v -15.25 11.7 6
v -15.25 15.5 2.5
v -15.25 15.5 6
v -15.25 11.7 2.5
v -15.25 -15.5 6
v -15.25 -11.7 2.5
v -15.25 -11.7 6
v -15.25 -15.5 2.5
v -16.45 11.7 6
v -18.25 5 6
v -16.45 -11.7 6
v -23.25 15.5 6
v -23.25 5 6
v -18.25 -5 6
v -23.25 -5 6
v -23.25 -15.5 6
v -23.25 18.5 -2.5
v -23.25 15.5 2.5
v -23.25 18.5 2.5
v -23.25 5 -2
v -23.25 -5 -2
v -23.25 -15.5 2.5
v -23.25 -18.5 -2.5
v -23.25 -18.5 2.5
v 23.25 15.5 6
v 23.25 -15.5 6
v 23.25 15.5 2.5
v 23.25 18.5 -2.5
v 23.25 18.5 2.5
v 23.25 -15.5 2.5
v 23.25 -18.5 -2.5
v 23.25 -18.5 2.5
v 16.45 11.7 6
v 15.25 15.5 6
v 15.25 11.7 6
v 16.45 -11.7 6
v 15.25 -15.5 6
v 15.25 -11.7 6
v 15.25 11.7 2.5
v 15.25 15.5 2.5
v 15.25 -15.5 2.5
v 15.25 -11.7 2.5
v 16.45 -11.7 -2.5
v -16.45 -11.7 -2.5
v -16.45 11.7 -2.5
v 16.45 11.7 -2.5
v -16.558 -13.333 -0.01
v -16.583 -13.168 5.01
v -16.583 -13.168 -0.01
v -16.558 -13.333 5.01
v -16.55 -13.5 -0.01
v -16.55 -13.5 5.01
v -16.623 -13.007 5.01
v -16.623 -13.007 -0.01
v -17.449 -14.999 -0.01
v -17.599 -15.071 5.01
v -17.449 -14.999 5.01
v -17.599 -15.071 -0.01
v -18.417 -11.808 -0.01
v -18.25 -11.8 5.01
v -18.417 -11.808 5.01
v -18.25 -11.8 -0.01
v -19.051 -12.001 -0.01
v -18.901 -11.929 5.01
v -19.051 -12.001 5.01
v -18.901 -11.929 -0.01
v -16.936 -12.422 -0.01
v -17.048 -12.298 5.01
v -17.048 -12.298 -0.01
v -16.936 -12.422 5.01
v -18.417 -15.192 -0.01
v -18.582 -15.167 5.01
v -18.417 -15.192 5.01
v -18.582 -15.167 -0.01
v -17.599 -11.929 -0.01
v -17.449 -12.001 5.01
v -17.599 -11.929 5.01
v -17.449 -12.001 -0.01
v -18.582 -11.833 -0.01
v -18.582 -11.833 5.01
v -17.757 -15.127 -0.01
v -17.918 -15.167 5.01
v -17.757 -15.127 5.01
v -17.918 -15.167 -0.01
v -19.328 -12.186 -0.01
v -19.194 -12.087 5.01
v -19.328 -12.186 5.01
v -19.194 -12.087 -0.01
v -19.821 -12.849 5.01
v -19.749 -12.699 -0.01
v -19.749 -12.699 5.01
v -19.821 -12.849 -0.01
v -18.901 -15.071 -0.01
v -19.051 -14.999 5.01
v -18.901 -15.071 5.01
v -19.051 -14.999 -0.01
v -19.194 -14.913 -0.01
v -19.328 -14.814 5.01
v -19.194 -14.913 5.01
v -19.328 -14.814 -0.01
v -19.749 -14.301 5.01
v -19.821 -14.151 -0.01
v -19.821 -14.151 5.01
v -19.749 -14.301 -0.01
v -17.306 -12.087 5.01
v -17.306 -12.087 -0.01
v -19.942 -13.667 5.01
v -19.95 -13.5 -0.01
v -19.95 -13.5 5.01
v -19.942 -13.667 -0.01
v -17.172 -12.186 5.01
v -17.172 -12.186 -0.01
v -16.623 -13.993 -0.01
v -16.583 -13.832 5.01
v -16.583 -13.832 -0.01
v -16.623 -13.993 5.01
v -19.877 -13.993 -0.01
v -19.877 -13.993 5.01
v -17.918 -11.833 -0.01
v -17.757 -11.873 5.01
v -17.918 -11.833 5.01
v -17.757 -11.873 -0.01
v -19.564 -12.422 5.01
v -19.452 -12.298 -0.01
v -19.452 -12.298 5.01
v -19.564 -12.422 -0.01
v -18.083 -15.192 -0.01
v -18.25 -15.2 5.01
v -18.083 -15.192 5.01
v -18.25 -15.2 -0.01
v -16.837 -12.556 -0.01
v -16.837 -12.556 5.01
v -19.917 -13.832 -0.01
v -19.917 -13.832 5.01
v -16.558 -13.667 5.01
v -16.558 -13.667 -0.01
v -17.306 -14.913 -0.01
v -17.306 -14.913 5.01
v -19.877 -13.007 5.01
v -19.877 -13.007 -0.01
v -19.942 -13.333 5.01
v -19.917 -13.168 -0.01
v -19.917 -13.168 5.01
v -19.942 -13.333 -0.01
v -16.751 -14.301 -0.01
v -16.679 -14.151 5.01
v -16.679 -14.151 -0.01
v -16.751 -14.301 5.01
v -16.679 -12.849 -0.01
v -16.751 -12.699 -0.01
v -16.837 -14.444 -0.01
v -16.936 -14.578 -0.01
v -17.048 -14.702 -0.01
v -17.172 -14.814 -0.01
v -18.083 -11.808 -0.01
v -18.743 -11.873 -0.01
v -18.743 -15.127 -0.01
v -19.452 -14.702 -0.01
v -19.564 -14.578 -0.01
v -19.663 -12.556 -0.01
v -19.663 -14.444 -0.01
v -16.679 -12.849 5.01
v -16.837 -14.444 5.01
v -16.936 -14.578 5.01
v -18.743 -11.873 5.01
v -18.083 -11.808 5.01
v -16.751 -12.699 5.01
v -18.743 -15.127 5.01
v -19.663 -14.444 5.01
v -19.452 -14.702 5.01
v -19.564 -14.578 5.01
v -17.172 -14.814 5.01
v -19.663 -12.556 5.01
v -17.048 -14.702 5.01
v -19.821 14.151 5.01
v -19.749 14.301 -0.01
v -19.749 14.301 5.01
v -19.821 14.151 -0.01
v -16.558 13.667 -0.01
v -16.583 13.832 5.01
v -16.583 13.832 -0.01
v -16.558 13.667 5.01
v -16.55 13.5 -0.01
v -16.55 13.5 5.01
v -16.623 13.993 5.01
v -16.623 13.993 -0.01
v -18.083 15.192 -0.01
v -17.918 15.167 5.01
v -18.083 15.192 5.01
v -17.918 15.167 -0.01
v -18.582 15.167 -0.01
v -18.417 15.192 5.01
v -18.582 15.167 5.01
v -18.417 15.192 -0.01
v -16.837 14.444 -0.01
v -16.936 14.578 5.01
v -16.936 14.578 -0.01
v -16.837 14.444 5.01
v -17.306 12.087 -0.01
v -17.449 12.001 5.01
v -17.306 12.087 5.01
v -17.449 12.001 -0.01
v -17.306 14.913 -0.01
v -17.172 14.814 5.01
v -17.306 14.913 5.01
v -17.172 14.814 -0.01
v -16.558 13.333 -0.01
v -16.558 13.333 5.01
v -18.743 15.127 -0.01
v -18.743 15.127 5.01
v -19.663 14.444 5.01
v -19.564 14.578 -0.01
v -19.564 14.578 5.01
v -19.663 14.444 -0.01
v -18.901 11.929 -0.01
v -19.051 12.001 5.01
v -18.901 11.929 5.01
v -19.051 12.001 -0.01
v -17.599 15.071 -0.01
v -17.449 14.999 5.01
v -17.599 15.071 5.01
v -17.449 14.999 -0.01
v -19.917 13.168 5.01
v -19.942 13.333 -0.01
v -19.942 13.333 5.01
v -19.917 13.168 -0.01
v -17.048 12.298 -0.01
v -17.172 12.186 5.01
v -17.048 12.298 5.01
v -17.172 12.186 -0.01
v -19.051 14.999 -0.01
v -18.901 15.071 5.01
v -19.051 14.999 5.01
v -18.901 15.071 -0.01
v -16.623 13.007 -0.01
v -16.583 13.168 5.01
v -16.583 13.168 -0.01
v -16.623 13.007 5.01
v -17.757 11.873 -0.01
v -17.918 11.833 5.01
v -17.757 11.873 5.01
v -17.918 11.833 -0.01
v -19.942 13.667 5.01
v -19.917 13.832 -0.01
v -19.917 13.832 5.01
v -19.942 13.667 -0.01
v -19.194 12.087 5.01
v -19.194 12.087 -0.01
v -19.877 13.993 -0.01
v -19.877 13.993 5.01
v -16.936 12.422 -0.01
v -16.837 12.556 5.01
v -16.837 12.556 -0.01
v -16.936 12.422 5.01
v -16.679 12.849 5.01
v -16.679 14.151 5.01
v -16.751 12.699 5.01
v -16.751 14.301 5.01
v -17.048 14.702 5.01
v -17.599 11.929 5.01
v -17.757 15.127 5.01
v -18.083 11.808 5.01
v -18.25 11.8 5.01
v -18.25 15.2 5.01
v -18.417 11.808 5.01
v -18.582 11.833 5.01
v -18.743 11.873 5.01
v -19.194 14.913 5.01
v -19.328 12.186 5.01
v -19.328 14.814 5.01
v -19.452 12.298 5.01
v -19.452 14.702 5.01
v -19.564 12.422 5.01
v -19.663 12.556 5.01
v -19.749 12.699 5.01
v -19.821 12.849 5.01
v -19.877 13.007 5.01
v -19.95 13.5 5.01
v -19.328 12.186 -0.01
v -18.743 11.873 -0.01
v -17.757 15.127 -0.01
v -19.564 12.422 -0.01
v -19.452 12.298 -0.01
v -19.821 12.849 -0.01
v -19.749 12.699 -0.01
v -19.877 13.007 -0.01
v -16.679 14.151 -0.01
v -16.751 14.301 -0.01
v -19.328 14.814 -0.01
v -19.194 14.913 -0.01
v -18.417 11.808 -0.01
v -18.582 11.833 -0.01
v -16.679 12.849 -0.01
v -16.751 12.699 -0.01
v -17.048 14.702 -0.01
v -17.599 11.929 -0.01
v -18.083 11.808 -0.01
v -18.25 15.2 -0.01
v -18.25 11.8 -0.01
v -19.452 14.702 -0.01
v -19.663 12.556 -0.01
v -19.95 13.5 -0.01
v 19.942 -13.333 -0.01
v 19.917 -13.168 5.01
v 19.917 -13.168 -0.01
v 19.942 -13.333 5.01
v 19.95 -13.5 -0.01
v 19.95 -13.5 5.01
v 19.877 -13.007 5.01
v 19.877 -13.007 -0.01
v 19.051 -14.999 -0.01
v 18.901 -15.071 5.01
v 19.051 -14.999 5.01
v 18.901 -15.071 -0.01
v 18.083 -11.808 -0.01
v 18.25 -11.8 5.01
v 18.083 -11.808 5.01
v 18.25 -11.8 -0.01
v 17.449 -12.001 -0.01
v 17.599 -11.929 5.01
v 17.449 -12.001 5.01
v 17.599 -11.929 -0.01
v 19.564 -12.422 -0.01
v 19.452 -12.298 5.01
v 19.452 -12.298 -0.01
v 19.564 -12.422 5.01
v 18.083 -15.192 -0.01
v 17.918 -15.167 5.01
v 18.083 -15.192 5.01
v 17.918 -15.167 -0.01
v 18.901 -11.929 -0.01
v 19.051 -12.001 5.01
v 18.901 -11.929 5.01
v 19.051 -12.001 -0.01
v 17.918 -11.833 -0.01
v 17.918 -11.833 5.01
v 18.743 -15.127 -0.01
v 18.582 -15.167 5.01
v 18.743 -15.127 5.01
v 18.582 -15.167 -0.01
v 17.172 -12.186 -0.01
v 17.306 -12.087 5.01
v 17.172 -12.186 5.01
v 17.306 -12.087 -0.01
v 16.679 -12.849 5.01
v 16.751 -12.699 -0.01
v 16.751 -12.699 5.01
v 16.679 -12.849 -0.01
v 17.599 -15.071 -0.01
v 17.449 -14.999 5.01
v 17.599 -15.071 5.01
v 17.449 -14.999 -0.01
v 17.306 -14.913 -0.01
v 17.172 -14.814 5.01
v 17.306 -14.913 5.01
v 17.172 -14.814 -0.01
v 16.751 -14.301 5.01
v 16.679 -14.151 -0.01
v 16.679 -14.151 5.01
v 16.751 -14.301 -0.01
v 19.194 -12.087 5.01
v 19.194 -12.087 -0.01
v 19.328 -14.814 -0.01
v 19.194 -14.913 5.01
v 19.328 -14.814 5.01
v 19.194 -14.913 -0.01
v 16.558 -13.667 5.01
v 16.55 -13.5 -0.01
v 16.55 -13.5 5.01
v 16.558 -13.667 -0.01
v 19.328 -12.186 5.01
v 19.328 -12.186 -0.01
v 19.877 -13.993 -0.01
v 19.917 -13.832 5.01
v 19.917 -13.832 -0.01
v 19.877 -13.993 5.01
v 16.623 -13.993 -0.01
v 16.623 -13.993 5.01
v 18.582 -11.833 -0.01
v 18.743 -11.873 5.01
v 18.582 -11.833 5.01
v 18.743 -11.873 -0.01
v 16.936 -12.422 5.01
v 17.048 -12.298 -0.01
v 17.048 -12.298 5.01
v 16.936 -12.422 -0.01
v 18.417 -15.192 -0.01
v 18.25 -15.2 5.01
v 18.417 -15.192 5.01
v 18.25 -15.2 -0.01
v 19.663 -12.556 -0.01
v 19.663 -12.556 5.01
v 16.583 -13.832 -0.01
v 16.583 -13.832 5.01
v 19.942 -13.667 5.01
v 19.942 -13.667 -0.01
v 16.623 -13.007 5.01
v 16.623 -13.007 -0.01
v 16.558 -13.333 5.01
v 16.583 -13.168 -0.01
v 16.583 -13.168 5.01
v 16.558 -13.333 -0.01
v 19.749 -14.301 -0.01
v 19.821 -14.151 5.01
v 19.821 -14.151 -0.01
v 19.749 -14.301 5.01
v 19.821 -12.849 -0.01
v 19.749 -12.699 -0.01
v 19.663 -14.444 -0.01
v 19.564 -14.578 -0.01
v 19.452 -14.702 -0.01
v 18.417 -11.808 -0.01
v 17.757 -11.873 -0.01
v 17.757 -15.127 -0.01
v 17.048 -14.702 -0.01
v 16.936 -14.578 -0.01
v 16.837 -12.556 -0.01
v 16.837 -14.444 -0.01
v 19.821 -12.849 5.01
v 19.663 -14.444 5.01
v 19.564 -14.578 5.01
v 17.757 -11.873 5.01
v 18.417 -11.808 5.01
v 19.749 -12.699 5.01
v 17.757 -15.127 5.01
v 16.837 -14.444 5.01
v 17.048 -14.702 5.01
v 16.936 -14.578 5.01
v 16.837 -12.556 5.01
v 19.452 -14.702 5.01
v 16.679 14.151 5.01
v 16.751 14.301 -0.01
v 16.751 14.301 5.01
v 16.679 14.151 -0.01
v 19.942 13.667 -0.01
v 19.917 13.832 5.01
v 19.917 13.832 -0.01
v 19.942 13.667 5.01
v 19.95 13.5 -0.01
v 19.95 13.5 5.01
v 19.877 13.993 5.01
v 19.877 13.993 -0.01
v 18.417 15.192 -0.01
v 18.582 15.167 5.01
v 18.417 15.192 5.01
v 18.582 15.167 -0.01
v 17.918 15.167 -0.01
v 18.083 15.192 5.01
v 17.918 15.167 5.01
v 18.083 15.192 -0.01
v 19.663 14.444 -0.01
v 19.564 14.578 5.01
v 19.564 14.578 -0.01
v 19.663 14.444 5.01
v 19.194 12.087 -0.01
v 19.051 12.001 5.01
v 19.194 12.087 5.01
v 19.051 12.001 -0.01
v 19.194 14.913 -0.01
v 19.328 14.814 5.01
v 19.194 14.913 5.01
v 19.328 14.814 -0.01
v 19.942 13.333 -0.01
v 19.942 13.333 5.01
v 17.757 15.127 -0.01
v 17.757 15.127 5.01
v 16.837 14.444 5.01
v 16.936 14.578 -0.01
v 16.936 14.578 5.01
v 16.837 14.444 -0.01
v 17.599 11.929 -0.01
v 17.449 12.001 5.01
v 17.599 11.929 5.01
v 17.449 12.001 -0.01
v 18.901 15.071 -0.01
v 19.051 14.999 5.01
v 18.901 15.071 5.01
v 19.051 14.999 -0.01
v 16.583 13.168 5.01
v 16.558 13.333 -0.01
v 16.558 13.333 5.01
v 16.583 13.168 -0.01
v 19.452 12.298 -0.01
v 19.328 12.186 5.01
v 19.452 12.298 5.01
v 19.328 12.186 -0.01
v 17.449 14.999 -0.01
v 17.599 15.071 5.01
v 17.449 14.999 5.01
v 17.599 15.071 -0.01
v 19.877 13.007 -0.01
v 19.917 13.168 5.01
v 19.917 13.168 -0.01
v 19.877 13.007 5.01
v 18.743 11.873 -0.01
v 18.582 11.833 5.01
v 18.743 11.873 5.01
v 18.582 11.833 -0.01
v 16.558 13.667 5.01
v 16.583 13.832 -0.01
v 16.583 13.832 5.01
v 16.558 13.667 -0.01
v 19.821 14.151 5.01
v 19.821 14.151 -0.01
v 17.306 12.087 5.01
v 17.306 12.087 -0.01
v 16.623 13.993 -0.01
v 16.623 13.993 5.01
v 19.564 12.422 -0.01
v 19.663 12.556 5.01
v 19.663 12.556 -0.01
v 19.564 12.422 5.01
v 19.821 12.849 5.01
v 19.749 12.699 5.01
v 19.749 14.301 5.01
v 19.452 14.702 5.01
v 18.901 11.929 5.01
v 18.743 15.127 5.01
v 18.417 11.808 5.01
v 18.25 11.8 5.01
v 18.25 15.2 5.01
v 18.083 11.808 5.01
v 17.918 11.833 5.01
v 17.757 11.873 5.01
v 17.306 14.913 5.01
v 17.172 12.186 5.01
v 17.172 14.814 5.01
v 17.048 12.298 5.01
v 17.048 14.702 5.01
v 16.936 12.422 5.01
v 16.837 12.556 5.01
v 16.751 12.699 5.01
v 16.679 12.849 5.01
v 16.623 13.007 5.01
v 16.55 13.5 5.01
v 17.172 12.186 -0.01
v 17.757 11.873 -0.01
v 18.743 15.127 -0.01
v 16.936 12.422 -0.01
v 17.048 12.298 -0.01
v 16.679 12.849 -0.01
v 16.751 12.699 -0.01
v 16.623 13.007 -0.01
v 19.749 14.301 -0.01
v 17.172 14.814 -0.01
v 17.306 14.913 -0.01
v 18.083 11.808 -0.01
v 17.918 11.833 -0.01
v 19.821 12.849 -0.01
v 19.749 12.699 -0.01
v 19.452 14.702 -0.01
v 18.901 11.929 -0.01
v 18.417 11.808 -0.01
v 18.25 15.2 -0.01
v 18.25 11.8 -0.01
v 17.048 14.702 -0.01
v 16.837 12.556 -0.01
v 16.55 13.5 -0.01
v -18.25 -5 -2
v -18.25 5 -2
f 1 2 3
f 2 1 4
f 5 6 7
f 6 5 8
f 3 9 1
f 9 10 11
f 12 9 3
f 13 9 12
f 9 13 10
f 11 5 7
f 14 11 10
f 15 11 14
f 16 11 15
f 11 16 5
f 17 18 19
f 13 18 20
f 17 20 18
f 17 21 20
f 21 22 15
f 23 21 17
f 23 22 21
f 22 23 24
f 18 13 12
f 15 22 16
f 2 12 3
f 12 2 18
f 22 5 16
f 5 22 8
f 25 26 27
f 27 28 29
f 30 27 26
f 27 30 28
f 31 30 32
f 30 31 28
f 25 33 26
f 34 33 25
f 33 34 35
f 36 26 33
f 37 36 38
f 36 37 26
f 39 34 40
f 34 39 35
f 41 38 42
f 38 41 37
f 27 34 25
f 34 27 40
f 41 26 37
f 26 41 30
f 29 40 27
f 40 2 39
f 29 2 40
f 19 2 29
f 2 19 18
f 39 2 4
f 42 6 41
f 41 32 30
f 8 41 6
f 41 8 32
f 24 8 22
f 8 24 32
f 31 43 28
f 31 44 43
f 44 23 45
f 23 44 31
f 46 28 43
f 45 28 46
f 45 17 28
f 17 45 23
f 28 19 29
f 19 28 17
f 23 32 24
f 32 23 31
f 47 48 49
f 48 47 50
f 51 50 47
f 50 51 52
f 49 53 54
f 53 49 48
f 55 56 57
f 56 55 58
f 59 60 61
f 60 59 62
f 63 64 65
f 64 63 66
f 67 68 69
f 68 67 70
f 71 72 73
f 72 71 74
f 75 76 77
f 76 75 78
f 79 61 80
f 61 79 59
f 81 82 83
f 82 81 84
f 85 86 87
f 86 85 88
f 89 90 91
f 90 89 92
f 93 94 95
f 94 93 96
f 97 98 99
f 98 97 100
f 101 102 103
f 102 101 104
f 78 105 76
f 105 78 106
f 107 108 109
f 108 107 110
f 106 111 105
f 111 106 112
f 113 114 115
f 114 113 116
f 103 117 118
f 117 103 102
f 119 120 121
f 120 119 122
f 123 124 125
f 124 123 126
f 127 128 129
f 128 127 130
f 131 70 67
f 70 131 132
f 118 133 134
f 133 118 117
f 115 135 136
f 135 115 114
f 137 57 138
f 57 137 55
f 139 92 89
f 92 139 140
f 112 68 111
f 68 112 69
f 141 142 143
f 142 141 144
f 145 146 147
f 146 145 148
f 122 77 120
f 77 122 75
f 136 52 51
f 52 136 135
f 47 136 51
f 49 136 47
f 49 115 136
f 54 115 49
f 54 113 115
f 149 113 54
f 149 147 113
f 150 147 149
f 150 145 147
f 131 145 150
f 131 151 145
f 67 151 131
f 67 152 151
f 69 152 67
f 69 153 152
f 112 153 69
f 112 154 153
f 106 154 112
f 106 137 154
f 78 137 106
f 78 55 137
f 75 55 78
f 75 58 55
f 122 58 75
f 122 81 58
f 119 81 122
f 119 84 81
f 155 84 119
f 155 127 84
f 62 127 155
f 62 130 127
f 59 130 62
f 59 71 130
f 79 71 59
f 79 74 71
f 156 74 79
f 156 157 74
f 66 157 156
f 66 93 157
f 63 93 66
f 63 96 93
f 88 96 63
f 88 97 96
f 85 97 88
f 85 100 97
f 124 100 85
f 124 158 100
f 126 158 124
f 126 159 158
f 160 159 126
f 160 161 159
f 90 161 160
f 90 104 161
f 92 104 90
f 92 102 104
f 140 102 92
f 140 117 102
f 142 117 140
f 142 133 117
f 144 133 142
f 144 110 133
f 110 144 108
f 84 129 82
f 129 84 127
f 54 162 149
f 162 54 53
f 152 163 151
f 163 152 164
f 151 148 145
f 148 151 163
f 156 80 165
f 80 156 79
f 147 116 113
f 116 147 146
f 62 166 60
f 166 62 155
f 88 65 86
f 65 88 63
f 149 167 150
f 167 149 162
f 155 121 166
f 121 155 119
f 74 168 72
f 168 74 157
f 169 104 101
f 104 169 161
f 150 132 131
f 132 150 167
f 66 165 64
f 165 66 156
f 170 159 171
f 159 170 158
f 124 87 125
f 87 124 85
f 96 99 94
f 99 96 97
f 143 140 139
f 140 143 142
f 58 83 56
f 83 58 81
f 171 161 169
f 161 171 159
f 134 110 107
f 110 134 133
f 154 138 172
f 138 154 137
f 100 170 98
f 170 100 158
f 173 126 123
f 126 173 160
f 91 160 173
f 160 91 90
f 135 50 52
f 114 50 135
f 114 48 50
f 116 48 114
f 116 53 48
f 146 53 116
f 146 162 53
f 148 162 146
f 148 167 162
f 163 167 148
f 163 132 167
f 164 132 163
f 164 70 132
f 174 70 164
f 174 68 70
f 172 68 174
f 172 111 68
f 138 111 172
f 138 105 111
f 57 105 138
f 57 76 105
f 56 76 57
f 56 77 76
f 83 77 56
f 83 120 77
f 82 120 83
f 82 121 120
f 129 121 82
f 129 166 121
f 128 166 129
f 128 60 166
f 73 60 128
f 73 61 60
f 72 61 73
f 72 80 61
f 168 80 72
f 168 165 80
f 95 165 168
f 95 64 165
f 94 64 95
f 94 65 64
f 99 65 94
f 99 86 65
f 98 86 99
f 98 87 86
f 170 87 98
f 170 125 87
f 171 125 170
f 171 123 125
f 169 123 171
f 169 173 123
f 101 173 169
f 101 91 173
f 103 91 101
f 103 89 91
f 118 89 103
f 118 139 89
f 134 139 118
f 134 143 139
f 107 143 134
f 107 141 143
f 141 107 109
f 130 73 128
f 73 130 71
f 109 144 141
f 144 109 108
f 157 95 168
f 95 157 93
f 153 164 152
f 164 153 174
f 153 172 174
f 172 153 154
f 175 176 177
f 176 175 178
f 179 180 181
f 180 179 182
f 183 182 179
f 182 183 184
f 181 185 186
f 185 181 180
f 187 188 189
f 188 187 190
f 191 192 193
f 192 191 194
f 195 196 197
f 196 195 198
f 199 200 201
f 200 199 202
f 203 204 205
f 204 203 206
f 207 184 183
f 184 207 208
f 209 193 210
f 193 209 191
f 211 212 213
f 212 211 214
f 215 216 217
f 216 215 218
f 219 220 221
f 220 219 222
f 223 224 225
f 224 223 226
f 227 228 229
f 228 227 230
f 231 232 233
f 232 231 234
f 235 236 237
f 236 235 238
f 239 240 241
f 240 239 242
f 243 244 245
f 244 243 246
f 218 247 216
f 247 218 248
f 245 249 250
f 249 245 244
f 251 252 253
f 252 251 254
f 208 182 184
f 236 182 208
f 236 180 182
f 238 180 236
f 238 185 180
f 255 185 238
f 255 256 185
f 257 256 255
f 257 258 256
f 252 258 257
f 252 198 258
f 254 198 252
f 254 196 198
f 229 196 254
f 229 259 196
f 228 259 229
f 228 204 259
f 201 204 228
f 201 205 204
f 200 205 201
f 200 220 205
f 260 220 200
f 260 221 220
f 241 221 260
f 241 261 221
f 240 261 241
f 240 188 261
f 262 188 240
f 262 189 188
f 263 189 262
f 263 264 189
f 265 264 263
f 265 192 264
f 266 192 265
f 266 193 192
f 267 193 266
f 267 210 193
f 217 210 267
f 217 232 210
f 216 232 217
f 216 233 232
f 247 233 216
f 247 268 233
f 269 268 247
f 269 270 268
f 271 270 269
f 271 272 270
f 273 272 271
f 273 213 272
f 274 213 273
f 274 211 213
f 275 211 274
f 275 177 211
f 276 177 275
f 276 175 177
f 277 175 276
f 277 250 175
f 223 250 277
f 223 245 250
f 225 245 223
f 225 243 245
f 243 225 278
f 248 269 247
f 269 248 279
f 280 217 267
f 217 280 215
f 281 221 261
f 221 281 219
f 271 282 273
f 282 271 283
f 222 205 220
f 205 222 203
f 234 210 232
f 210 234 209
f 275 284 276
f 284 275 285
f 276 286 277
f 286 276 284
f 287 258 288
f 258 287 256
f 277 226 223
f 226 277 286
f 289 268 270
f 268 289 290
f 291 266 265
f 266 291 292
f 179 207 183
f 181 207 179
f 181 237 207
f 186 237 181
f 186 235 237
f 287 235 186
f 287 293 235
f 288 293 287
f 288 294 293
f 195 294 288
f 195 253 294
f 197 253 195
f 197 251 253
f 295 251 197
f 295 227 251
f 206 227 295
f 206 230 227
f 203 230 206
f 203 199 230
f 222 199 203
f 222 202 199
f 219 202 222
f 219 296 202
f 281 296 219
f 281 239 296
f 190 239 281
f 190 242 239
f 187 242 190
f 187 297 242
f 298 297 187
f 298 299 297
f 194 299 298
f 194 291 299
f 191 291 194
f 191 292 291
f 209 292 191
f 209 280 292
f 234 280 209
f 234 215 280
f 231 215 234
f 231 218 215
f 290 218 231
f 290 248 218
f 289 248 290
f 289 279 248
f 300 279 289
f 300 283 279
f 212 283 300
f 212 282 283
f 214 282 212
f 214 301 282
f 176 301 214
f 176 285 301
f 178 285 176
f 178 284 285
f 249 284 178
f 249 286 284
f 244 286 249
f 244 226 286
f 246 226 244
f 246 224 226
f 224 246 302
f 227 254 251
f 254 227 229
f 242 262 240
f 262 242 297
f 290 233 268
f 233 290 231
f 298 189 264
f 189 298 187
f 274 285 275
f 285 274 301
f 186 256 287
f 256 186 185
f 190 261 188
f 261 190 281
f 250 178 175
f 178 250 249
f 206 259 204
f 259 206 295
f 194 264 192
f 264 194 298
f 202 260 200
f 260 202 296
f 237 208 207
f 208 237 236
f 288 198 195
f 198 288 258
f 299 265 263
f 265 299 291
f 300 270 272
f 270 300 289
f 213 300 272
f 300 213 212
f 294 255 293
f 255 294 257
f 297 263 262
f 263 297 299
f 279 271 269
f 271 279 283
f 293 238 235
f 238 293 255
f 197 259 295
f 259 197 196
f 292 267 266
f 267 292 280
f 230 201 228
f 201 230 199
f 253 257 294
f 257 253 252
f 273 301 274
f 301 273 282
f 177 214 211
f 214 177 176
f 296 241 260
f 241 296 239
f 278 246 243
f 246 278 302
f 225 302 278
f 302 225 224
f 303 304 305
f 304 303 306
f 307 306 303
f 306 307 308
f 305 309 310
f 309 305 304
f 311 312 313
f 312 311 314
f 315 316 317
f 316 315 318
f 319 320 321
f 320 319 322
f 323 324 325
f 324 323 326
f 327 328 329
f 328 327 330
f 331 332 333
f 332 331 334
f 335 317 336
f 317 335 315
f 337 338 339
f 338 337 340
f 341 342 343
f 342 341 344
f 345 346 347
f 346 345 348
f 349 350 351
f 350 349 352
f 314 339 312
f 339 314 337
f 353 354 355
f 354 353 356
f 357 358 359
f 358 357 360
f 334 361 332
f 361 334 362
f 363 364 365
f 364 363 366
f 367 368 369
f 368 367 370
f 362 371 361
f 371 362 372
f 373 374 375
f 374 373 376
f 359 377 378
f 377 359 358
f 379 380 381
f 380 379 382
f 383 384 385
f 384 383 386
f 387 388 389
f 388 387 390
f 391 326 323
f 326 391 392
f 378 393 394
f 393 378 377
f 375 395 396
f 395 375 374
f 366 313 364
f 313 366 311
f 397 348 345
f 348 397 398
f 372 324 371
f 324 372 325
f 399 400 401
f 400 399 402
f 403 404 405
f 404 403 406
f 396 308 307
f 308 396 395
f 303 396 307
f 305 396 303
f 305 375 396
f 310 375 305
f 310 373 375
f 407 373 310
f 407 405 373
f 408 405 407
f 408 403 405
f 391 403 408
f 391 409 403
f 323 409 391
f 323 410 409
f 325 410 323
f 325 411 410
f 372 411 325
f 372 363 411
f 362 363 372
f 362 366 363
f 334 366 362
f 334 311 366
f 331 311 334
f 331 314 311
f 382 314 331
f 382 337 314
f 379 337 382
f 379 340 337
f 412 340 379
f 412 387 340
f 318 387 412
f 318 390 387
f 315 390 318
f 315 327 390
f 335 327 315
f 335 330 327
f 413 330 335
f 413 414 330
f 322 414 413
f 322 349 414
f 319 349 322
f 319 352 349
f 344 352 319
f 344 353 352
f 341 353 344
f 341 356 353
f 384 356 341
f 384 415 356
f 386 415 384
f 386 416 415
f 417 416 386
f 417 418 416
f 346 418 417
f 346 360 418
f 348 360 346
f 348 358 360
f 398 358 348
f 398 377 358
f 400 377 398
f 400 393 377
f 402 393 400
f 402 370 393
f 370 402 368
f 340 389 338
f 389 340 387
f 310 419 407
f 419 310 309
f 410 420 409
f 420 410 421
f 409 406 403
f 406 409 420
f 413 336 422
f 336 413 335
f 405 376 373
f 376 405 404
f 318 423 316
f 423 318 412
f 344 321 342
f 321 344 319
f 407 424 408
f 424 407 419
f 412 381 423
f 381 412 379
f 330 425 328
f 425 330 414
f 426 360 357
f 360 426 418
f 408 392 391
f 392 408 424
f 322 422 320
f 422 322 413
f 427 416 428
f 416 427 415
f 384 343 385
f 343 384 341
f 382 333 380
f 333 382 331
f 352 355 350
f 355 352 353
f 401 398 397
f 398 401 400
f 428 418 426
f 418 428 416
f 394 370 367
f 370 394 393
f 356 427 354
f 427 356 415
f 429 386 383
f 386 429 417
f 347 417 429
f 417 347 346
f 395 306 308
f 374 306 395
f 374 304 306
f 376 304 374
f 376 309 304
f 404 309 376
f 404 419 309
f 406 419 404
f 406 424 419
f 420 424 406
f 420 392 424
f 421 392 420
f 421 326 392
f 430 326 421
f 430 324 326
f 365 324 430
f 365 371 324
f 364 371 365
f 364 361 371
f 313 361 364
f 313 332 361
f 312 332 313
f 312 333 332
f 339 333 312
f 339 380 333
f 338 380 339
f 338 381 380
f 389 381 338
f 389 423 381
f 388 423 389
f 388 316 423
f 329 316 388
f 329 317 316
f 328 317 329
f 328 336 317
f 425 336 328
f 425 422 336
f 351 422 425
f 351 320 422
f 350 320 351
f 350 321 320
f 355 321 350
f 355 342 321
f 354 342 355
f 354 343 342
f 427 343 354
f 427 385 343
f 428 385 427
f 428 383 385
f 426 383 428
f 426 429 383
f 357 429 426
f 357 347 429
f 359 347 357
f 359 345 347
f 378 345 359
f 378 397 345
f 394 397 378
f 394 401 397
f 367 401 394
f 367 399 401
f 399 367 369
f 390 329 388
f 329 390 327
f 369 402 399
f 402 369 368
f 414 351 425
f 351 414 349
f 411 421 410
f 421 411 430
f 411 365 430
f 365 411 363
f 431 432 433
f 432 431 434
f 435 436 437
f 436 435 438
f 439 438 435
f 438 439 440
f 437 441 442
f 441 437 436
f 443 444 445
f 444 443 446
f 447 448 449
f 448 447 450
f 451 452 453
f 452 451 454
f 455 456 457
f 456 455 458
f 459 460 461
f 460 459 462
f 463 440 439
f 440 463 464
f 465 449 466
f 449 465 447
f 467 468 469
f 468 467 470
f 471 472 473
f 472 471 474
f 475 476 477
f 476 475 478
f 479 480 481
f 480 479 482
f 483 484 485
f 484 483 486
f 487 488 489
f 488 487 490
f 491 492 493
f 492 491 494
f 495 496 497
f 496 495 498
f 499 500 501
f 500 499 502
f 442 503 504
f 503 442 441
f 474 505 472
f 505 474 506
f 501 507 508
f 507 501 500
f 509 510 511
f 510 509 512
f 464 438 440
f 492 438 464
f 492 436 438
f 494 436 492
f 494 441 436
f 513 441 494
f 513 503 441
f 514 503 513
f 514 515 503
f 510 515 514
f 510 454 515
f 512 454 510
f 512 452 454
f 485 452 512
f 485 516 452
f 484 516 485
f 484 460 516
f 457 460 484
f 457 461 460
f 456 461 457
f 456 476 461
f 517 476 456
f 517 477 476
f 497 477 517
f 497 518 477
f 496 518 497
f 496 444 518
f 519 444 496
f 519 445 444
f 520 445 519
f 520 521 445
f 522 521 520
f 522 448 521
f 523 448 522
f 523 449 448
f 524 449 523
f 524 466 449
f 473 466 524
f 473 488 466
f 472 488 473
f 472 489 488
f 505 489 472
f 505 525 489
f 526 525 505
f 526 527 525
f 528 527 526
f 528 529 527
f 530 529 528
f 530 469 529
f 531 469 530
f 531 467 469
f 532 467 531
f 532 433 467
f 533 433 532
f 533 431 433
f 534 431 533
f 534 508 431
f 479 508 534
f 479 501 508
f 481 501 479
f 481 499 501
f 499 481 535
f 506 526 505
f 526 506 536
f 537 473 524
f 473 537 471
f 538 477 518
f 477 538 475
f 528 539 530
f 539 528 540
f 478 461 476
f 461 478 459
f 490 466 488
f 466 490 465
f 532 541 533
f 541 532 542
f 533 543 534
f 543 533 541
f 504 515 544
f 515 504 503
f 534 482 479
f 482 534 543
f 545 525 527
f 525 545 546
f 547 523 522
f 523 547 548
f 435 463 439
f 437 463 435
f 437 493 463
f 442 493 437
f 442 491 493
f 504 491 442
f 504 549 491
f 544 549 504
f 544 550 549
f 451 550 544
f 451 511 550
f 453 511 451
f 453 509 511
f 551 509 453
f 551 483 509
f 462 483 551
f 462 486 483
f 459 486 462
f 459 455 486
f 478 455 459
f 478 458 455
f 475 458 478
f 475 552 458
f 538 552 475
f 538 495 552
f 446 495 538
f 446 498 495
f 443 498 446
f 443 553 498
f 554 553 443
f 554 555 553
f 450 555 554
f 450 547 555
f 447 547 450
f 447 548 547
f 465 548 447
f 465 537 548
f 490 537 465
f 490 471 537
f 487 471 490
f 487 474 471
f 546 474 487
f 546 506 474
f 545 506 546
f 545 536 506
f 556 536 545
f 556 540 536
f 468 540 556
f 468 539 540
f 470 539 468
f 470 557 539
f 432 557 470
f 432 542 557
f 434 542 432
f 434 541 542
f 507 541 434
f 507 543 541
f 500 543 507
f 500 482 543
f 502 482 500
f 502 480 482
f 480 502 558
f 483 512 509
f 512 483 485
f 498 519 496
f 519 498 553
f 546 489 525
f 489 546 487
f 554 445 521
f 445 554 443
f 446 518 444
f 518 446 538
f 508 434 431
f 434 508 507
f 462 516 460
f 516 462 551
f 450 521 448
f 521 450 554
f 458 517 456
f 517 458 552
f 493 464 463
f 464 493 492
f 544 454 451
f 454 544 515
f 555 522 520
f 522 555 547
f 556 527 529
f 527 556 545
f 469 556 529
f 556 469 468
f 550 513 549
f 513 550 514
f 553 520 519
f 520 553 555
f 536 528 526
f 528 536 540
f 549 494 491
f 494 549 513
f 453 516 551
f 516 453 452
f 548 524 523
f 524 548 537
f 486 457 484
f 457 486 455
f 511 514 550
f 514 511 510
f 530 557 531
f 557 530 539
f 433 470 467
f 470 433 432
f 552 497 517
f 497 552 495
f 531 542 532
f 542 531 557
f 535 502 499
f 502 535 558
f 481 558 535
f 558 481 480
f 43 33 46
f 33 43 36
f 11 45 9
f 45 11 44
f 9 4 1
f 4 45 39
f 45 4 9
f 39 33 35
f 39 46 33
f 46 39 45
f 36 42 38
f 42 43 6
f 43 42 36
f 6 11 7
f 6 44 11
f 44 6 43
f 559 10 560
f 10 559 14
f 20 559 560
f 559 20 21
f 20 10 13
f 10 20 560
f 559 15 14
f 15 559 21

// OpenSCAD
// file: params.scad
// ============================================================================
//  Робосумо 3 кг — спільні параметри
//  Усі розміри в міліметрах. Прав завжди тут, а не в окремих деталях.
//
//  Позначки:
//    ✅  підтверджено з даташита виробника
//    ❓  VERIFY — виміряй свою деталь штангенциркулем і виправ
// ============================================================================

// --- габарит робота ---------------------------------------------------------
CHASSIS_W       = 200;      // ✅ ліміт класу 200 x 200 мм
CHASSIS_L       = 200;
PLATE_T         = 6;        // товщина друкованого прототипу основи
ALLOY_T         = 4;        // товщина алюмінієвої бойової основи

// --- колеса -----------------------------------------------------------------
WHEEL_D         = 50;
WHEEL_W         = 15;
WHEEL_TRACK     = 150;      // між центрами коліс уздовж осі X
WHEELBASE       = 130;      // між центрами коліс уздовж осі Y

// --- мотор Pololu 37D (✅ усі з pololu.com/product/4745) --------------------
MOTOR_BODY_D    = 37;       // ✅ діаметр корпусу редуктора
MOTOR_SHAFT_D   = 6;        // ✅ D-подібний вал
MOTOR_SHAFT_L   = 16;       // ✅ довжина вала
MOTOR_HEX_PITCH = 15.5;     // ✅ суміжні отвори кріплення, правильний шестикутник
MOTOR_HEX_R     = MOTOR_HEX_PITCH / sqrt(3);   // ≈ 8.949 радіус описаного кола
MOTOR_SCREW_MAX = 3;        // ✅ Pololu: НЕ закручувати глибше 3 мм — дістане шестерні
MOTOR_TOTAL_L   = 57;       // ✅ 37Dx57L

// --- кріплення --------------------------------------------------------------
M3_CLEAR        = 3.4;
M3_TAP          = 2.9;
M2_CLEAR        = 2.2;
HEATSET_M3_D    = 4.0;      // отвір під термозакладну гайку M3
HEATSET_M3_H    = 5.7;

// --- плати (❓ виміряй свої) ------------------------------------------------
NANO_W          = 18;       // ✅ стандарт Arduino Nano
NANO_L          = 45;
NANO_HOLE_DX    = 15.24;    // ✅ 0.6 дюйма
NANO_HOLE_DY    = 43.18;    // ✅ 1.7 дюйма

BTS_W           = 25;       // ❓ VERIFY — плата BTS7960 / IBT-2
BTS_L           = 50;       // ❓ VERIFY
BTS_HOLE_DX     = 15;       // ❓ VERIFY
BTS_HOLE_DY     = 44;       // ❓ VERIFY
BTS_QTY         = 4;

QTR_W           = 12;       // ❓ VERIFY — Pololu QTR-8A
QTR_L           = 75;       // ❓ VERIFY
QTR_HOLE_DX     = 10;       // ❓ VERIFY
QTR_HOLE_DY     = 67;       // ❓ VERIFY

// --- акумулятор (❓ виміряй свій) -------------------------------------------
LIP_W           = 34;       // ❓ VERIFY — 6S 2200 мА·год
LIP_L           = 105;      // ❓ VERIFY
LIP_H           = 26;       // ❓ VERIFY

// --- клин -------------------------------------------------------------------
BLADE_W         = 190;
BLADE_T         = 3;
BLADE_ANGLE     = 12;       // ✅ наш вибір: 8–12° за «Blackbook»
BLADE_SCREWS    = 4;

// --- серво ------------------------------------------------------------------
SERVO_W         = 23;       // SG90
SERVO_L         = 32.5;
SERVO_H         = 29;

// --- магніти -----------------------------------------------------------------
MAG_W           = 20;       // 20 x 20 x 5 мм N52
MAG_D           = 5;

// --- якість друку -----------------------------------------------------------
$fn = 64;                   // гладкість круглих отворів
EPS = 0.01;                 // мікро-перекриття для булевих операцій

// ============================================================================
//  Допоміжні модулі
// ============================================================================

// Отвір під гвинт M3 з фаскою, щоб гвинт сідав рівно
module m3_hole(h = 20, head = true) {
    cylinder(d = M3_CLEAR, h = h + 2*EPS, center = true);
    if (head)
        translate([0, 0, h/2])
            cylinder(d1 = M3_CLEAR, d2 = 6.2, h = 1.6);
}

// Отвір під термозакладну гайку M3 (зверху вниз)
module heatset_hole() {
    cylinder(d = HEATSET_M3_D, h = HEATSET_M3_H, center = false);
    translate([0, 0, HEATSET_M3_H])
        cylinder(d = M3_CLEAR, h = 20);
}

// Шість отворів кріплення мотора 37D на правильному шестикутнику.
// Суміжні отвори рознесені рівно на MOTOR_HEX_PITCH.
module motor_mount_holes(depth = 20) {
    for (a = [0 : 60 : 359])
        rotate([0, 0, a])
            translate([MOTOR_HEX_R, 0, 0])
                cylinder(d = M3_CLEAR, h = depth + 2*EPS, center = true);
}

// Шестикутна кишеня під корпус мотора — щоб мотор сів у площину
module motor_body_pocket(depth = 2) {
    translate([0, 0, -depth/2])
        cylinder(d = MOTOR_BODY_D + 0.4, h = depth + EPS, center = true);
}

// Масив отворів по колу — для маточин і фланців
module bolt_circle(dia, n, hole_d = M3_CLEAR, depth = 20) {
    for (i = [0 : n-1])
        rotate([0, 0, i * 360 / n])
            translate([dia/2, 0, 0])
                cylinder(d = hole_d, h = depth + 2*EPS, center = true);
}

// Плита зі скругленими кутами
module rounded_plate(w, h, t, r = 8) {
    linear_extrude(height = t)
        offset(r = r) offset(delta = -r)
            square([w - 2*r, h - 2*r], center = true);
}
// main file
// ============================================================================
//  08 — Кріплення серво SG90 для розкладних бокових клинів
//  Правила дозволяють змінювати габарит після старту, тож серво
//  викидає бокові клини за ~100–150 мс після сигналу.
// ============================================================================

include <params.scad>

BRACKET_T   = 5;
SERVO_CLEAR = 0.4;

module servo_mount() {
    W = SERVO_L + 14;
    H = SERVO_W + 14;

    difference() {
        union() {
            // основна площина
            cube([W, H, BRACKET_T], center = true);

            // два вушка під гвинти серво (SG90 кріпиться за вушка)
            for (sx = [-1, 1])
                translate([sx * (SERVO_L/2 + 3), 0, BRACKET_T/2])
                    cube([8, SERVO_W + 8, BRACKET_T + 2], center = true);
        }

        // кишеня під корпус серво
        translate([0, 0, BRACKET_T/2 + 2])
            cube([SERVO_L + SERVO_CLEAR, SERVO_W + SERVO_CLEAR,
                  BRACKET_T + 24], center = true);

        // проріз під качалку
        translate([SERVO_L/2 - 4, 0, BRACKET_T/2 + 8])
            rotate([0, 90, 0])
                cylinder(d = 8, h = 20, center = true);

        // отвори кріплення до основи
        for (sx = [-1, 1], sy = [-1, 1])
            translate([sx * (W/2 - 5), sy * (H/2 - 5), -EPS])
                cylinder(d = M3_CLEAR, h = BRACKET_T + 2*EPS);

        // виріз під кабель серво
        translate([-W/2, 0, BRACKET_T/2])
            cube([10, 10, BRACKET_T + 4], center = true);
    }
}

servo_mount();
